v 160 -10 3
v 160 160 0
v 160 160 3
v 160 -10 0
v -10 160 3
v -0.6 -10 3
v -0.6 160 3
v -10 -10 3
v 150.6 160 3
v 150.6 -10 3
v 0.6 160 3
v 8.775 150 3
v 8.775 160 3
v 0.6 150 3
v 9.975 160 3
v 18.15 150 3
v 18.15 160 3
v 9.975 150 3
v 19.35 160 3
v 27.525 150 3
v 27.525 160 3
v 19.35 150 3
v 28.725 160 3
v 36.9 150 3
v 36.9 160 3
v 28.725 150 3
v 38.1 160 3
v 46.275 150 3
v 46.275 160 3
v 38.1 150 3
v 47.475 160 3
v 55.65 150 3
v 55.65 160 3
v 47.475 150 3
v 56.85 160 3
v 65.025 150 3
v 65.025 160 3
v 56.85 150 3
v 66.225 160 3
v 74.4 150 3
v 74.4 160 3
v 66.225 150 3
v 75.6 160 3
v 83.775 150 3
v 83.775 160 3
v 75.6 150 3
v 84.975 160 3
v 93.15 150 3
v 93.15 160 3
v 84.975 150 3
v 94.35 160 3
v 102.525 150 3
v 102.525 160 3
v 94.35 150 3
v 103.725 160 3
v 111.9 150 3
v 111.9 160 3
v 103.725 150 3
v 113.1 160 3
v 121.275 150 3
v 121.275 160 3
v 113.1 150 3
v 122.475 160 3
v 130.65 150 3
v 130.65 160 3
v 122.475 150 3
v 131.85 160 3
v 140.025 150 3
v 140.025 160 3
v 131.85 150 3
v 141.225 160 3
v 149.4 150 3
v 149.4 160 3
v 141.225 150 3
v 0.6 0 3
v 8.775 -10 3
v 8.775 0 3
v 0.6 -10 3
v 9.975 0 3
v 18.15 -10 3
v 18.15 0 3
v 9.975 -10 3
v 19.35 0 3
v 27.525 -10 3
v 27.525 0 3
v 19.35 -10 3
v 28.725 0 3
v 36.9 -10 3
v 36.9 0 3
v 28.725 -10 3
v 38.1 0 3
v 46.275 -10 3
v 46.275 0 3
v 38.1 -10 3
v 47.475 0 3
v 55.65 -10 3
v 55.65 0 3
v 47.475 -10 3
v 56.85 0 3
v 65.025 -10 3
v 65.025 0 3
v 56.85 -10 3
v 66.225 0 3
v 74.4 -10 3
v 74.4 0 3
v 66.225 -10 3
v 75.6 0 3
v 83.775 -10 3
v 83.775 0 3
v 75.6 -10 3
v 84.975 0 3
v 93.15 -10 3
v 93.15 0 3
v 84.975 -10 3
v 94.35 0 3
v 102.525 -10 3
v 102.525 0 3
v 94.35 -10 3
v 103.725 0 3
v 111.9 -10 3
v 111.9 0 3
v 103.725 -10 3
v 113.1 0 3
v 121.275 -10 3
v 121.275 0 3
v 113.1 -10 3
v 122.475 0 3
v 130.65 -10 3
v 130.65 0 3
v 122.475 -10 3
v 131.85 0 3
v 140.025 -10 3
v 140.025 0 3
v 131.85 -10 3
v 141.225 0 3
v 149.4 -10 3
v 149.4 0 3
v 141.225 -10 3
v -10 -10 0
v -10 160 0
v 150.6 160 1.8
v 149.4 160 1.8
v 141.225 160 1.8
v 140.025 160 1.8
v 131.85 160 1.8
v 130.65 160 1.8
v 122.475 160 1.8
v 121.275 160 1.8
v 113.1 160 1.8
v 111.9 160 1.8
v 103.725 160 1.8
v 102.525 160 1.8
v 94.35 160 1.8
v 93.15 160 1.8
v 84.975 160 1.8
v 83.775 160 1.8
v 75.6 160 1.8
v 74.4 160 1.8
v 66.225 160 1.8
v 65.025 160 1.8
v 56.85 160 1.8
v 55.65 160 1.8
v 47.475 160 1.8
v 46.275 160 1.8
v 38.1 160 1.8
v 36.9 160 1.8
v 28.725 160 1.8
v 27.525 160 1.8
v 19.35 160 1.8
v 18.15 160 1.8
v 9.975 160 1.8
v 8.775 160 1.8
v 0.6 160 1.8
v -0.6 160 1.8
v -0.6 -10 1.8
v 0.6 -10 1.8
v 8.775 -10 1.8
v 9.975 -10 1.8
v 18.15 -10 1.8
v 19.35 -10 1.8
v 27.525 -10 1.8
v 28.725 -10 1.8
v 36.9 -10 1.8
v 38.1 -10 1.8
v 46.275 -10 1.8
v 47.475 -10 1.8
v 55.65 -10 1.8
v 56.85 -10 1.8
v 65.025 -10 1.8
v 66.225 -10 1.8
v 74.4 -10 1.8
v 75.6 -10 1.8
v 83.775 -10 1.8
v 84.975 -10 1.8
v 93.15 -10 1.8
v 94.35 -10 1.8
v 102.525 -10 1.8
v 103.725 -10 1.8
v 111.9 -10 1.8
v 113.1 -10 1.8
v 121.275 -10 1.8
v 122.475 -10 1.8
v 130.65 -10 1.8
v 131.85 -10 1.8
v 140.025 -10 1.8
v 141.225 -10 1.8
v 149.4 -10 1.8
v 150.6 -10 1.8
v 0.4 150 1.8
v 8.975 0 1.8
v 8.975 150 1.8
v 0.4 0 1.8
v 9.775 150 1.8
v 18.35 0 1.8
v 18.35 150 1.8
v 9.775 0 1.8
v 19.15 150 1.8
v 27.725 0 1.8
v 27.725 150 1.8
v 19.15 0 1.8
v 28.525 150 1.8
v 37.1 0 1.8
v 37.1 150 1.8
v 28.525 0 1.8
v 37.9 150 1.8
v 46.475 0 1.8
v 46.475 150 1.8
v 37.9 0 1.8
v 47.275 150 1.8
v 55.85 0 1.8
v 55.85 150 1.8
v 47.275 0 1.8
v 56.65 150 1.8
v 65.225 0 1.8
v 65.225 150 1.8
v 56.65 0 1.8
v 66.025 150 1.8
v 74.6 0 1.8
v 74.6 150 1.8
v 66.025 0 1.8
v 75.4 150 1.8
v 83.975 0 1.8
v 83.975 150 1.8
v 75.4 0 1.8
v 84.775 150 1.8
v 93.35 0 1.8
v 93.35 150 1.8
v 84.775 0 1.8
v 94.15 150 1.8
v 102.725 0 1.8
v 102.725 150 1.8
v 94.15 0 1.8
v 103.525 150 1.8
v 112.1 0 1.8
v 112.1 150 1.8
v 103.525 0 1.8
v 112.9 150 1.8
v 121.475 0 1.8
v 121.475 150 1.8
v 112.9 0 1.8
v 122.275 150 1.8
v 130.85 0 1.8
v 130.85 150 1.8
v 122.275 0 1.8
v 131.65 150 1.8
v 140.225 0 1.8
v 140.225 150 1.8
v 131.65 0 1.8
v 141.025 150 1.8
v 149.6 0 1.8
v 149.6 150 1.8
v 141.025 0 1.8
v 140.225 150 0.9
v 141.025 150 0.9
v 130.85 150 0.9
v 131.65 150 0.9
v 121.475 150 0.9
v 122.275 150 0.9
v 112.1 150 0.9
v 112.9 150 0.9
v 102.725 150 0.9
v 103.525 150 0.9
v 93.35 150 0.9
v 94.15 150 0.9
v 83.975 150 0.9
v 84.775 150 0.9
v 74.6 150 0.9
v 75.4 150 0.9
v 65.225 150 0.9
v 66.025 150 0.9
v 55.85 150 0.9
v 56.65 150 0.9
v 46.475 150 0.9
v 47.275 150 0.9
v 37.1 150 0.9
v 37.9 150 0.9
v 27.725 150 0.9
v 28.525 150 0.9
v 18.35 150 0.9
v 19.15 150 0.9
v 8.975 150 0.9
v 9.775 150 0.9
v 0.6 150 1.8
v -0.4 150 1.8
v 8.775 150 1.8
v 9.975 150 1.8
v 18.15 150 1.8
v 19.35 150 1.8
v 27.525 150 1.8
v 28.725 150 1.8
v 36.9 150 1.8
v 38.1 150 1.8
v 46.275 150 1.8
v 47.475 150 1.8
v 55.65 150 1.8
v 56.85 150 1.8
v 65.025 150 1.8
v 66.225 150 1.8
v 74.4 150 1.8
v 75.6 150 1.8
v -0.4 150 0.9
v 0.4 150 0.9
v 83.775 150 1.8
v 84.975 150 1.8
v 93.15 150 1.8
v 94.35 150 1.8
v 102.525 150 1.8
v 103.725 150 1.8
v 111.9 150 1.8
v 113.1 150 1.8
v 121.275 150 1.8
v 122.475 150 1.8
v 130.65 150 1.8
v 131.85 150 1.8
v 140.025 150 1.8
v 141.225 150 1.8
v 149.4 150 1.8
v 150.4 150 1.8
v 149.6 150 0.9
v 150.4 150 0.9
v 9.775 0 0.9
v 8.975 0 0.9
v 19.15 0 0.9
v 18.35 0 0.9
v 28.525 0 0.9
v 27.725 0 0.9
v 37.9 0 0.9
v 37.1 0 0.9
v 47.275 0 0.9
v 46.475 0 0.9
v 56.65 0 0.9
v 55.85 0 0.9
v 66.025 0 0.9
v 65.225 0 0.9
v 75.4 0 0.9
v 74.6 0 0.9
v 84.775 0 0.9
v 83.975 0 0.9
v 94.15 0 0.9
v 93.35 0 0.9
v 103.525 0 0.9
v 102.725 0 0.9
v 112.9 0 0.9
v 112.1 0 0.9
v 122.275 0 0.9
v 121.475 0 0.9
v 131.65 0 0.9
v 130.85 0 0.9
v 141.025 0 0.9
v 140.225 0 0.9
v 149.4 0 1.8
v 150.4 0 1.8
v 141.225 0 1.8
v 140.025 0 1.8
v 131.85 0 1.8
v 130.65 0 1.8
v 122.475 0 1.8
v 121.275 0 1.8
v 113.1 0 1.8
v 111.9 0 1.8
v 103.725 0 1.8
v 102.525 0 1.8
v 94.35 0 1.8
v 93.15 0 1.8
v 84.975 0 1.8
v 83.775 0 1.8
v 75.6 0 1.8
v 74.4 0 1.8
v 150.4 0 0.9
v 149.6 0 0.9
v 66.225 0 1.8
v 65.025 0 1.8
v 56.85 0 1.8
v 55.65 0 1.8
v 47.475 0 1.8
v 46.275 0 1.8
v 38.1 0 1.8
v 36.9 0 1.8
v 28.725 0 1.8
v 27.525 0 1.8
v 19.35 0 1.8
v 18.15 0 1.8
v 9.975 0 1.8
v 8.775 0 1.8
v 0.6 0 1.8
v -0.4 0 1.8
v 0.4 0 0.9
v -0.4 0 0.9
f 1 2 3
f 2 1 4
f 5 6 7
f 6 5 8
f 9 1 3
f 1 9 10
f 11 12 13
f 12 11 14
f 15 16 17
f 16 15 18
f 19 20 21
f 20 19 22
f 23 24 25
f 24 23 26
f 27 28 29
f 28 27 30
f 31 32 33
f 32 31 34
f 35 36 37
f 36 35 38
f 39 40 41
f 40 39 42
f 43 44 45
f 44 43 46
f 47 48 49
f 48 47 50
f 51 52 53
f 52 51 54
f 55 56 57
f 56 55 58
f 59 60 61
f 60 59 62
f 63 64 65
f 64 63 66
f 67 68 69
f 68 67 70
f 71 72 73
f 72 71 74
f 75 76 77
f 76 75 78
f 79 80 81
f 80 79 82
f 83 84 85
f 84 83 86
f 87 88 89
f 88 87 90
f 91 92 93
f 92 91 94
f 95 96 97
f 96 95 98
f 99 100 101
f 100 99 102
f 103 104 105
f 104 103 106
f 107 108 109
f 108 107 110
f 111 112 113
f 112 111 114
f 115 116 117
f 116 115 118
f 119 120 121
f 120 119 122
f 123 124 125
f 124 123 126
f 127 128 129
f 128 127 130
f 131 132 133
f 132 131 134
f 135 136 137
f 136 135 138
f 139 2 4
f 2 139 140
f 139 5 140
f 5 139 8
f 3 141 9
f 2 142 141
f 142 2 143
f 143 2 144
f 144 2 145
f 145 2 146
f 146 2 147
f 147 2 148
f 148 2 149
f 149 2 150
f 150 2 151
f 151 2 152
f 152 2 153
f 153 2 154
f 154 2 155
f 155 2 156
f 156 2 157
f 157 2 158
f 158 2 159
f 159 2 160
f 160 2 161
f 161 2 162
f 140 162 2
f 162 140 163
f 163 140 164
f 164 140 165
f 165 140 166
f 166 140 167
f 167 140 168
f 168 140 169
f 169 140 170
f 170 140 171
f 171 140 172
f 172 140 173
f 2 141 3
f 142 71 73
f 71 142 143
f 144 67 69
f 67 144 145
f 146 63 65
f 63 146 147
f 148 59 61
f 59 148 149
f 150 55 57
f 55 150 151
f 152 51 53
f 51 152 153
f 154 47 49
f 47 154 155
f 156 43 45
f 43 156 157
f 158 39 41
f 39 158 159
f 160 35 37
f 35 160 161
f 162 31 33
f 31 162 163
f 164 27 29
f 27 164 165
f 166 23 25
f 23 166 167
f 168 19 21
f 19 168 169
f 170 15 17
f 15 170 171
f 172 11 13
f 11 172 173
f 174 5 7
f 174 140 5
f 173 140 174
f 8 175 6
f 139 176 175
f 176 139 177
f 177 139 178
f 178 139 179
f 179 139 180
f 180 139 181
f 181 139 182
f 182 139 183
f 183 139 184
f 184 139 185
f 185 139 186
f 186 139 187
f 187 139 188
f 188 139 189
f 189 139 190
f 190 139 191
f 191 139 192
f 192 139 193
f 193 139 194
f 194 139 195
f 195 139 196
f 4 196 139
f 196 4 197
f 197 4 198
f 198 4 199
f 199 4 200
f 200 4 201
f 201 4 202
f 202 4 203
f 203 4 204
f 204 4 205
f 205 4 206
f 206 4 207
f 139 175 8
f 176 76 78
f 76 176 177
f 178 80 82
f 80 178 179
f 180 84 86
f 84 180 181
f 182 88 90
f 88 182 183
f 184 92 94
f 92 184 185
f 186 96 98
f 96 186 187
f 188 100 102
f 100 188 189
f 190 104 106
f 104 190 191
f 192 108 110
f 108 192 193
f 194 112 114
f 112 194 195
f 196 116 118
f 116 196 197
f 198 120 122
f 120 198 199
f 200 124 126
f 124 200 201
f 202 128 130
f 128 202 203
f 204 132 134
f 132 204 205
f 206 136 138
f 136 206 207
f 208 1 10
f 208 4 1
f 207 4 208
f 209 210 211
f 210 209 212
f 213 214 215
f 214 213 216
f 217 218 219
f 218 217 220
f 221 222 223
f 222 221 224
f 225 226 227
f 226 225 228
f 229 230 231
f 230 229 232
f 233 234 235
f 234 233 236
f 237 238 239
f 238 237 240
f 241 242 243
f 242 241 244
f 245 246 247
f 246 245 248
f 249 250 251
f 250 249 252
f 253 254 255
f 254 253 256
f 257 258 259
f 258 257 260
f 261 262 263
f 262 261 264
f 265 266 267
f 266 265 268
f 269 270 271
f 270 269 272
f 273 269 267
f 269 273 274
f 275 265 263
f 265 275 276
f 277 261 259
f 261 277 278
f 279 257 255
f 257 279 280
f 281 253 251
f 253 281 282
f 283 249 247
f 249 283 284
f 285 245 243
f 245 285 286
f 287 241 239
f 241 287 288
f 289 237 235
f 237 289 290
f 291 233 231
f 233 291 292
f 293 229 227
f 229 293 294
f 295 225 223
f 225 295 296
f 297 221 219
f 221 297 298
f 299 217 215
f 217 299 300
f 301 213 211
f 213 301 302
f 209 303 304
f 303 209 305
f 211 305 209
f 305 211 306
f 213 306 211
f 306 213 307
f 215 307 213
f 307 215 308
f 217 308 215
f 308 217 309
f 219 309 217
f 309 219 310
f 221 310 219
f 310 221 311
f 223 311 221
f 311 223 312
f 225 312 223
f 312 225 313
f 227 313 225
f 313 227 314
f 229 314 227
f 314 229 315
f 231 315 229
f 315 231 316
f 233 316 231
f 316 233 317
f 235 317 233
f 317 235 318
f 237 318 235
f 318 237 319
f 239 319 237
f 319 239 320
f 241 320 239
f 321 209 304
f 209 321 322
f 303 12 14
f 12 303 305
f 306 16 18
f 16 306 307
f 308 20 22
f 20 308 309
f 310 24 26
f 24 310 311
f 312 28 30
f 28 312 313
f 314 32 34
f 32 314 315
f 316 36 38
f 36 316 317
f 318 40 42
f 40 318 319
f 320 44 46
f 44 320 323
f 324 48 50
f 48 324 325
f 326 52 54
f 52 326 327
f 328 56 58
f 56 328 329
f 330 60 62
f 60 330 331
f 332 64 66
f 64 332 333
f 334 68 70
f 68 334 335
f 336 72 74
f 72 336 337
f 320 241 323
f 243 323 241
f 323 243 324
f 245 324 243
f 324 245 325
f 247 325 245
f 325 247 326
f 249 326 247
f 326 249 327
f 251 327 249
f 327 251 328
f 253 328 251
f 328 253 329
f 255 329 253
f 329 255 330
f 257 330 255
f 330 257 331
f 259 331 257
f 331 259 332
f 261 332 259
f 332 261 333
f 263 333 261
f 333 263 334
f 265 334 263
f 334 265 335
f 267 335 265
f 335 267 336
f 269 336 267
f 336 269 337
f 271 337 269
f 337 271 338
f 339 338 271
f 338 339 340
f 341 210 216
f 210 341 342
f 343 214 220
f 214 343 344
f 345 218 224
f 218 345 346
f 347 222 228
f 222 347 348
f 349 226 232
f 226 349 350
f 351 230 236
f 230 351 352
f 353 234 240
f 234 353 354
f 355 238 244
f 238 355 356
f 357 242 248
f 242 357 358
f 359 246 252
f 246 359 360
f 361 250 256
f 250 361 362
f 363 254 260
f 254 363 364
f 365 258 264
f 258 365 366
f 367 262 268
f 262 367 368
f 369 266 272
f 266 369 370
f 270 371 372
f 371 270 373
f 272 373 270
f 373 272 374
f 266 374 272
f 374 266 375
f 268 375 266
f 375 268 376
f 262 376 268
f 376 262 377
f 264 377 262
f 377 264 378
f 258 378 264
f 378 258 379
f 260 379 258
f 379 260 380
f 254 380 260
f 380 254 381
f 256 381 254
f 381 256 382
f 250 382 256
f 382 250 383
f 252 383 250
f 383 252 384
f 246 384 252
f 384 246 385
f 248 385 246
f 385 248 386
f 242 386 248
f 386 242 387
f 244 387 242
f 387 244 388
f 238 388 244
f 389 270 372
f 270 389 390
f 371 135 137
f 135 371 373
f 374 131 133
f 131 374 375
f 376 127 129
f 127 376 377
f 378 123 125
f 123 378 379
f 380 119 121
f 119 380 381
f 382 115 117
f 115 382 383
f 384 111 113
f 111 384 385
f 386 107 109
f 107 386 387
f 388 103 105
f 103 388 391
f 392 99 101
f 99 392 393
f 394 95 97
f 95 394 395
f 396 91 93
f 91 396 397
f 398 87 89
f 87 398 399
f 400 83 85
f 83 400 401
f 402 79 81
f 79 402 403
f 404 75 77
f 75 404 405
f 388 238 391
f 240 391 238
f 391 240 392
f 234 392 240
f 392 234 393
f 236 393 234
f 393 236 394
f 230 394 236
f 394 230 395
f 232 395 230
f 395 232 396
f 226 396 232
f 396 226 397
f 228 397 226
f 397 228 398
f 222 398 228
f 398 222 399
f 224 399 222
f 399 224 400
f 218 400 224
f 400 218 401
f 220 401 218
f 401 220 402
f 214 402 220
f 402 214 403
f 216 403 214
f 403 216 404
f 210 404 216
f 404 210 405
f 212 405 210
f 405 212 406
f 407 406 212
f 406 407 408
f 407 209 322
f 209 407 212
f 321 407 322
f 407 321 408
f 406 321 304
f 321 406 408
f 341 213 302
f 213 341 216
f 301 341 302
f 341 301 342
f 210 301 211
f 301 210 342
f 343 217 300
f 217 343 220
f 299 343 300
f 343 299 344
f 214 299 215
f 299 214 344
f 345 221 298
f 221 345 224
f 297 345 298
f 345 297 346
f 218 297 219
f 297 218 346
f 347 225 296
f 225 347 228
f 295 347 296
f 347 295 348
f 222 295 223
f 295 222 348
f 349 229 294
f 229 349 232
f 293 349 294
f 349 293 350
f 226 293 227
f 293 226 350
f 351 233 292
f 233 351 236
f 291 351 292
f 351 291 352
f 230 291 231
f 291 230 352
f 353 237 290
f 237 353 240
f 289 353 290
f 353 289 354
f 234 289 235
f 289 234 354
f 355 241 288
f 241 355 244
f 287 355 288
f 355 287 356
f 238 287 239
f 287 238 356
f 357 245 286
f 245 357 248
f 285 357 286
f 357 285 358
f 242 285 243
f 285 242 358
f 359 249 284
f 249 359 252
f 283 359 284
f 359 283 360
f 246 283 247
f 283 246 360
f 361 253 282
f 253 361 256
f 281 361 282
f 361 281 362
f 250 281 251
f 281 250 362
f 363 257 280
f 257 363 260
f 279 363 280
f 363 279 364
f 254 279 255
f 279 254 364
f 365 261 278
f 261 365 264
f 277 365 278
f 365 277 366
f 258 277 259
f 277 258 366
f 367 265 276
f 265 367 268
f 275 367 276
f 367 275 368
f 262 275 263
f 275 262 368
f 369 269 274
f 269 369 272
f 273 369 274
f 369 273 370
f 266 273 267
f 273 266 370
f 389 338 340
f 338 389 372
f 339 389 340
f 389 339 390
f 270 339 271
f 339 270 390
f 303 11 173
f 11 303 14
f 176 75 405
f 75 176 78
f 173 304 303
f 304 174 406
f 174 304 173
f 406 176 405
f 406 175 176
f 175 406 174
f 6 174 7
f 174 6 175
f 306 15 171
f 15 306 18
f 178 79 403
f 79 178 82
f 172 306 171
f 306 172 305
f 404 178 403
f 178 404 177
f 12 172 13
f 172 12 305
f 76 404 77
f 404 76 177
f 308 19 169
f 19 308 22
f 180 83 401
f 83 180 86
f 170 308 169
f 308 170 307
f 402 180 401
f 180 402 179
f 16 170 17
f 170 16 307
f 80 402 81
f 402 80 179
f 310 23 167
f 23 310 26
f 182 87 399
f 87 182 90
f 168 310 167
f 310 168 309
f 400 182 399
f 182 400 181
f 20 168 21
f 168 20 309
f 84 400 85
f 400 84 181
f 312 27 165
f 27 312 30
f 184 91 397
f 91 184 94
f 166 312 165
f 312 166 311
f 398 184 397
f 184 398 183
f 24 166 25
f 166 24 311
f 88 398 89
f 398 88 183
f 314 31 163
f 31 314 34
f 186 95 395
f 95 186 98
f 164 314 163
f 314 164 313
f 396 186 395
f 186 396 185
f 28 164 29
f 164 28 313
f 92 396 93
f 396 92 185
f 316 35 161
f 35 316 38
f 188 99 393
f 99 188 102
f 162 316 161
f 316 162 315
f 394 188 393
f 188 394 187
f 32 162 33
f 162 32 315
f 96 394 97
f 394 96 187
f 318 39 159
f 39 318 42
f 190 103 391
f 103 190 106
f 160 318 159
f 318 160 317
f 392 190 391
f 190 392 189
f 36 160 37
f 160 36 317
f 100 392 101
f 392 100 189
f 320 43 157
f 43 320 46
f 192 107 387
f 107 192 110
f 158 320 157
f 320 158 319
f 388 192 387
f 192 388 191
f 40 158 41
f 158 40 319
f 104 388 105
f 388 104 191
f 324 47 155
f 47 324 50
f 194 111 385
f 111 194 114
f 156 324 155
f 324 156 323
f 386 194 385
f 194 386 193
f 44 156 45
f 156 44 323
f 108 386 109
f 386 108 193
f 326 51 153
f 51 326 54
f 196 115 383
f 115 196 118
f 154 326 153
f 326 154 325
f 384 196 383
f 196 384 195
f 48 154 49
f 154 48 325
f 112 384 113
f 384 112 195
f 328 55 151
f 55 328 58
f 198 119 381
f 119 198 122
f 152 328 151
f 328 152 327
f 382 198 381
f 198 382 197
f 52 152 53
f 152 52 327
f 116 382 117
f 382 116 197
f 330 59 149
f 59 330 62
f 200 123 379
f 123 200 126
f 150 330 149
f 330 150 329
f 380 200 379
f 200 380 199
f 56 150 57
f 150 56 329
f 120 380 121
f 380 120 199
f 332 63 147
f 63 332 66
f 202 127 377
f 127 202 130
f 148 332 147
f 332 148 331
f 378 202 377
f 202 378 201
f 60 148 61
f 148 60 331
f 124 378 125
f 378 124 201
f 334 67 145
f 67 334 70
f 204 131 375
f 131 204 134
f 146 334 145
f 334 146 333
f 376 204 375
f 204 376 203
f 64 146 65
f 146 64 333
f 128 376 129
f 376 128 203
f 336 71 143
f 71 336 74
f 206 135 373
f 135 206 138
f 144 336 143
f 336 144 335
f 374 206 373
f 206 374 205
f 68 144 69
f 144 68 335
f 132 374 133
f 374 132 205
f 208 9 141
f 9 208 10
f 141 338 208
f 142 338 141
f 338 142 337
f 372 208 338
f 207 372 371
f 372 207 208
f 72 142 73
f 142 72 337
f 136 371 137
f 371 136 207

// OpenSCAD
// file: base_grids.scad
// Create a square grid. dimensions and separations are bidimensionnal vectors
module squaregrid(creasethickness, creasewidth, dimensions, separations,singlecrease = false) {
  xseparationwidth = dimensions[0] / (separations[0]);
  for(i = [0:separations[0]]) {
    translate([-creasewidth / 2 + i * xseparationwidth, 0, 0])
      cube([creasewidth, dimensions[1], creasethickness]);
  }
  if(!singlecrease){
      yseparationwidth = dimensions[1] / (separations[1]);
  for(i = [0:separations[1]]) {
    translate([0, -creasewidth / 2 + i * yseparationwidth, 0])
      cube([dimensions[0], creasewidth, creasethickness]);
  }
      }
  

}
//squaregrid(0.2,0.5,[100,80],[10,8],singlecrease = false);
// Create a triangle grid. dimensions is a bidimensionnal vector and steps a scalar
module triangulargrid(creasethickness, creasewidth, dimensions, steps,singlecrease = false,intersectionned = true) {
  intersection() {
       if(intersectionned){
           translate([0, 0, -5000])
      cube([dimensions[0], dimensions[1], 10000]);
           }else{
               
              translate([-50000/2, -50000/2, -50000/2])
                    cube([100000, 100000, 100000]); 
               }
      

      union() {
      separations = pow(2, steps);
      separationwidth = dimensions[0] / (separations);
      if(!singlecrease){
          for(i = [0:separations * 2]) {
        translate([-creasewidth / 2 + i * separationwidth / 2, 0, 0])
          cube([creasewidth, dimensions[1], creasethickness]);
      }
          }
      
      middlepoint = dimensions[1] / 2;
      diagonallenght = middlepoint / sin(30)+10000;
      halfdistance = (dimensions[0] / 2) * (sin(30) / sin(60));
      //echo(halfdistance);
      for(step = [0:steps]) {
        //pow(2,step)-1]
        for(lines = [-(pow(2, step) - 1):pow(2, step) - 1]) {
          translate([0, (halfdistance * 2 / pow(2, step)) * lines, 0])
          
            for(sign = [-1, 1]) {
                if(!singlecrease || sign == -1){
                    translate([0, middlepoint - creasewidth / 2, 0])
                rotate([0, 0, 30 * sign])
                  translate([-5000,0,0])cube([diagonallenght, creasewidth, creasethickness]);
              translate([dimensions[0], middlepoint - creasewidth / 2, 0])
                translate([0,0,creasethickness])rotate([0, 180, 30 * sign])
                  translate([-5000,0,0])cube([diagonallenght, creasewidth, creasethickness]);
                    }
              
            }
        }
      }


    }
  }


}


function trianglegridunitside(dimensionx,steps) = (dimensionx/pow(2,steps+1)* (sin(90) / sin(60)));// /pow(2,steps+1);
//echo(trianglegridunitside(100,1));
//triangulargrid(1, 0.5, [100, 100], 1,singlecrease = false,intersectionned=true);
// main file
use <base_grids.scad>

sheetwidth = 150;
sidewidth = 10;
steps = 3;

basethickness = 1.8;
sidethickness = 1.2;

creasedepth = 0.9;
creastwidth = 0.8;
creastwidthguide = 1.2;

totalwidth = sheetwidth +sidewidth*2;
module base(){
    translate([-sidewidth,-sidewidth,0])difference(){
        cube([totalwidth,totalwidth,basethickness+sidethickness]);
        translate([sidewidth,sidewidth,basethickness])cube([sheetwidth,sheetwidth,basethickness+sidethickness]);
        }
    
    }

module triangular_grid(){
    difference(){
        base();
    translate([0,0,basethickness-creasedepth])triangulargrid(creasedepth+1, creastwidth, [sheetwidth, sheetwidth], steps,singlecrease = true); 
        translate([0,0,basethickness]) triangulargrid(creasedepth+100, creastwidthguide, [sheetwidth, sheetwidth], steps,singlecrease = true,intersectionned = false); 
        }
   
    }
//triangular_grid();
module square_grid(){
     difference(){
        base();
    translate([0,0,basethickness-creasedepth]) squaregrid(creasedepth+1, creastwidth,[sheetwidth,sheetwidth],[pow(2,steps+1),pow(2,steps+1)],singlecrease = true);
         translate([0,-sheetwidth/2,basethickness]) scale([1,2,1])squaregrid(creasedepth+1, creastwidthguide,[sheetwidth,sheetwidth],[pow(2,steps+1),pow(2,steps+1)],singlecrease = true);
        }
    
    }
  
square_grid();
